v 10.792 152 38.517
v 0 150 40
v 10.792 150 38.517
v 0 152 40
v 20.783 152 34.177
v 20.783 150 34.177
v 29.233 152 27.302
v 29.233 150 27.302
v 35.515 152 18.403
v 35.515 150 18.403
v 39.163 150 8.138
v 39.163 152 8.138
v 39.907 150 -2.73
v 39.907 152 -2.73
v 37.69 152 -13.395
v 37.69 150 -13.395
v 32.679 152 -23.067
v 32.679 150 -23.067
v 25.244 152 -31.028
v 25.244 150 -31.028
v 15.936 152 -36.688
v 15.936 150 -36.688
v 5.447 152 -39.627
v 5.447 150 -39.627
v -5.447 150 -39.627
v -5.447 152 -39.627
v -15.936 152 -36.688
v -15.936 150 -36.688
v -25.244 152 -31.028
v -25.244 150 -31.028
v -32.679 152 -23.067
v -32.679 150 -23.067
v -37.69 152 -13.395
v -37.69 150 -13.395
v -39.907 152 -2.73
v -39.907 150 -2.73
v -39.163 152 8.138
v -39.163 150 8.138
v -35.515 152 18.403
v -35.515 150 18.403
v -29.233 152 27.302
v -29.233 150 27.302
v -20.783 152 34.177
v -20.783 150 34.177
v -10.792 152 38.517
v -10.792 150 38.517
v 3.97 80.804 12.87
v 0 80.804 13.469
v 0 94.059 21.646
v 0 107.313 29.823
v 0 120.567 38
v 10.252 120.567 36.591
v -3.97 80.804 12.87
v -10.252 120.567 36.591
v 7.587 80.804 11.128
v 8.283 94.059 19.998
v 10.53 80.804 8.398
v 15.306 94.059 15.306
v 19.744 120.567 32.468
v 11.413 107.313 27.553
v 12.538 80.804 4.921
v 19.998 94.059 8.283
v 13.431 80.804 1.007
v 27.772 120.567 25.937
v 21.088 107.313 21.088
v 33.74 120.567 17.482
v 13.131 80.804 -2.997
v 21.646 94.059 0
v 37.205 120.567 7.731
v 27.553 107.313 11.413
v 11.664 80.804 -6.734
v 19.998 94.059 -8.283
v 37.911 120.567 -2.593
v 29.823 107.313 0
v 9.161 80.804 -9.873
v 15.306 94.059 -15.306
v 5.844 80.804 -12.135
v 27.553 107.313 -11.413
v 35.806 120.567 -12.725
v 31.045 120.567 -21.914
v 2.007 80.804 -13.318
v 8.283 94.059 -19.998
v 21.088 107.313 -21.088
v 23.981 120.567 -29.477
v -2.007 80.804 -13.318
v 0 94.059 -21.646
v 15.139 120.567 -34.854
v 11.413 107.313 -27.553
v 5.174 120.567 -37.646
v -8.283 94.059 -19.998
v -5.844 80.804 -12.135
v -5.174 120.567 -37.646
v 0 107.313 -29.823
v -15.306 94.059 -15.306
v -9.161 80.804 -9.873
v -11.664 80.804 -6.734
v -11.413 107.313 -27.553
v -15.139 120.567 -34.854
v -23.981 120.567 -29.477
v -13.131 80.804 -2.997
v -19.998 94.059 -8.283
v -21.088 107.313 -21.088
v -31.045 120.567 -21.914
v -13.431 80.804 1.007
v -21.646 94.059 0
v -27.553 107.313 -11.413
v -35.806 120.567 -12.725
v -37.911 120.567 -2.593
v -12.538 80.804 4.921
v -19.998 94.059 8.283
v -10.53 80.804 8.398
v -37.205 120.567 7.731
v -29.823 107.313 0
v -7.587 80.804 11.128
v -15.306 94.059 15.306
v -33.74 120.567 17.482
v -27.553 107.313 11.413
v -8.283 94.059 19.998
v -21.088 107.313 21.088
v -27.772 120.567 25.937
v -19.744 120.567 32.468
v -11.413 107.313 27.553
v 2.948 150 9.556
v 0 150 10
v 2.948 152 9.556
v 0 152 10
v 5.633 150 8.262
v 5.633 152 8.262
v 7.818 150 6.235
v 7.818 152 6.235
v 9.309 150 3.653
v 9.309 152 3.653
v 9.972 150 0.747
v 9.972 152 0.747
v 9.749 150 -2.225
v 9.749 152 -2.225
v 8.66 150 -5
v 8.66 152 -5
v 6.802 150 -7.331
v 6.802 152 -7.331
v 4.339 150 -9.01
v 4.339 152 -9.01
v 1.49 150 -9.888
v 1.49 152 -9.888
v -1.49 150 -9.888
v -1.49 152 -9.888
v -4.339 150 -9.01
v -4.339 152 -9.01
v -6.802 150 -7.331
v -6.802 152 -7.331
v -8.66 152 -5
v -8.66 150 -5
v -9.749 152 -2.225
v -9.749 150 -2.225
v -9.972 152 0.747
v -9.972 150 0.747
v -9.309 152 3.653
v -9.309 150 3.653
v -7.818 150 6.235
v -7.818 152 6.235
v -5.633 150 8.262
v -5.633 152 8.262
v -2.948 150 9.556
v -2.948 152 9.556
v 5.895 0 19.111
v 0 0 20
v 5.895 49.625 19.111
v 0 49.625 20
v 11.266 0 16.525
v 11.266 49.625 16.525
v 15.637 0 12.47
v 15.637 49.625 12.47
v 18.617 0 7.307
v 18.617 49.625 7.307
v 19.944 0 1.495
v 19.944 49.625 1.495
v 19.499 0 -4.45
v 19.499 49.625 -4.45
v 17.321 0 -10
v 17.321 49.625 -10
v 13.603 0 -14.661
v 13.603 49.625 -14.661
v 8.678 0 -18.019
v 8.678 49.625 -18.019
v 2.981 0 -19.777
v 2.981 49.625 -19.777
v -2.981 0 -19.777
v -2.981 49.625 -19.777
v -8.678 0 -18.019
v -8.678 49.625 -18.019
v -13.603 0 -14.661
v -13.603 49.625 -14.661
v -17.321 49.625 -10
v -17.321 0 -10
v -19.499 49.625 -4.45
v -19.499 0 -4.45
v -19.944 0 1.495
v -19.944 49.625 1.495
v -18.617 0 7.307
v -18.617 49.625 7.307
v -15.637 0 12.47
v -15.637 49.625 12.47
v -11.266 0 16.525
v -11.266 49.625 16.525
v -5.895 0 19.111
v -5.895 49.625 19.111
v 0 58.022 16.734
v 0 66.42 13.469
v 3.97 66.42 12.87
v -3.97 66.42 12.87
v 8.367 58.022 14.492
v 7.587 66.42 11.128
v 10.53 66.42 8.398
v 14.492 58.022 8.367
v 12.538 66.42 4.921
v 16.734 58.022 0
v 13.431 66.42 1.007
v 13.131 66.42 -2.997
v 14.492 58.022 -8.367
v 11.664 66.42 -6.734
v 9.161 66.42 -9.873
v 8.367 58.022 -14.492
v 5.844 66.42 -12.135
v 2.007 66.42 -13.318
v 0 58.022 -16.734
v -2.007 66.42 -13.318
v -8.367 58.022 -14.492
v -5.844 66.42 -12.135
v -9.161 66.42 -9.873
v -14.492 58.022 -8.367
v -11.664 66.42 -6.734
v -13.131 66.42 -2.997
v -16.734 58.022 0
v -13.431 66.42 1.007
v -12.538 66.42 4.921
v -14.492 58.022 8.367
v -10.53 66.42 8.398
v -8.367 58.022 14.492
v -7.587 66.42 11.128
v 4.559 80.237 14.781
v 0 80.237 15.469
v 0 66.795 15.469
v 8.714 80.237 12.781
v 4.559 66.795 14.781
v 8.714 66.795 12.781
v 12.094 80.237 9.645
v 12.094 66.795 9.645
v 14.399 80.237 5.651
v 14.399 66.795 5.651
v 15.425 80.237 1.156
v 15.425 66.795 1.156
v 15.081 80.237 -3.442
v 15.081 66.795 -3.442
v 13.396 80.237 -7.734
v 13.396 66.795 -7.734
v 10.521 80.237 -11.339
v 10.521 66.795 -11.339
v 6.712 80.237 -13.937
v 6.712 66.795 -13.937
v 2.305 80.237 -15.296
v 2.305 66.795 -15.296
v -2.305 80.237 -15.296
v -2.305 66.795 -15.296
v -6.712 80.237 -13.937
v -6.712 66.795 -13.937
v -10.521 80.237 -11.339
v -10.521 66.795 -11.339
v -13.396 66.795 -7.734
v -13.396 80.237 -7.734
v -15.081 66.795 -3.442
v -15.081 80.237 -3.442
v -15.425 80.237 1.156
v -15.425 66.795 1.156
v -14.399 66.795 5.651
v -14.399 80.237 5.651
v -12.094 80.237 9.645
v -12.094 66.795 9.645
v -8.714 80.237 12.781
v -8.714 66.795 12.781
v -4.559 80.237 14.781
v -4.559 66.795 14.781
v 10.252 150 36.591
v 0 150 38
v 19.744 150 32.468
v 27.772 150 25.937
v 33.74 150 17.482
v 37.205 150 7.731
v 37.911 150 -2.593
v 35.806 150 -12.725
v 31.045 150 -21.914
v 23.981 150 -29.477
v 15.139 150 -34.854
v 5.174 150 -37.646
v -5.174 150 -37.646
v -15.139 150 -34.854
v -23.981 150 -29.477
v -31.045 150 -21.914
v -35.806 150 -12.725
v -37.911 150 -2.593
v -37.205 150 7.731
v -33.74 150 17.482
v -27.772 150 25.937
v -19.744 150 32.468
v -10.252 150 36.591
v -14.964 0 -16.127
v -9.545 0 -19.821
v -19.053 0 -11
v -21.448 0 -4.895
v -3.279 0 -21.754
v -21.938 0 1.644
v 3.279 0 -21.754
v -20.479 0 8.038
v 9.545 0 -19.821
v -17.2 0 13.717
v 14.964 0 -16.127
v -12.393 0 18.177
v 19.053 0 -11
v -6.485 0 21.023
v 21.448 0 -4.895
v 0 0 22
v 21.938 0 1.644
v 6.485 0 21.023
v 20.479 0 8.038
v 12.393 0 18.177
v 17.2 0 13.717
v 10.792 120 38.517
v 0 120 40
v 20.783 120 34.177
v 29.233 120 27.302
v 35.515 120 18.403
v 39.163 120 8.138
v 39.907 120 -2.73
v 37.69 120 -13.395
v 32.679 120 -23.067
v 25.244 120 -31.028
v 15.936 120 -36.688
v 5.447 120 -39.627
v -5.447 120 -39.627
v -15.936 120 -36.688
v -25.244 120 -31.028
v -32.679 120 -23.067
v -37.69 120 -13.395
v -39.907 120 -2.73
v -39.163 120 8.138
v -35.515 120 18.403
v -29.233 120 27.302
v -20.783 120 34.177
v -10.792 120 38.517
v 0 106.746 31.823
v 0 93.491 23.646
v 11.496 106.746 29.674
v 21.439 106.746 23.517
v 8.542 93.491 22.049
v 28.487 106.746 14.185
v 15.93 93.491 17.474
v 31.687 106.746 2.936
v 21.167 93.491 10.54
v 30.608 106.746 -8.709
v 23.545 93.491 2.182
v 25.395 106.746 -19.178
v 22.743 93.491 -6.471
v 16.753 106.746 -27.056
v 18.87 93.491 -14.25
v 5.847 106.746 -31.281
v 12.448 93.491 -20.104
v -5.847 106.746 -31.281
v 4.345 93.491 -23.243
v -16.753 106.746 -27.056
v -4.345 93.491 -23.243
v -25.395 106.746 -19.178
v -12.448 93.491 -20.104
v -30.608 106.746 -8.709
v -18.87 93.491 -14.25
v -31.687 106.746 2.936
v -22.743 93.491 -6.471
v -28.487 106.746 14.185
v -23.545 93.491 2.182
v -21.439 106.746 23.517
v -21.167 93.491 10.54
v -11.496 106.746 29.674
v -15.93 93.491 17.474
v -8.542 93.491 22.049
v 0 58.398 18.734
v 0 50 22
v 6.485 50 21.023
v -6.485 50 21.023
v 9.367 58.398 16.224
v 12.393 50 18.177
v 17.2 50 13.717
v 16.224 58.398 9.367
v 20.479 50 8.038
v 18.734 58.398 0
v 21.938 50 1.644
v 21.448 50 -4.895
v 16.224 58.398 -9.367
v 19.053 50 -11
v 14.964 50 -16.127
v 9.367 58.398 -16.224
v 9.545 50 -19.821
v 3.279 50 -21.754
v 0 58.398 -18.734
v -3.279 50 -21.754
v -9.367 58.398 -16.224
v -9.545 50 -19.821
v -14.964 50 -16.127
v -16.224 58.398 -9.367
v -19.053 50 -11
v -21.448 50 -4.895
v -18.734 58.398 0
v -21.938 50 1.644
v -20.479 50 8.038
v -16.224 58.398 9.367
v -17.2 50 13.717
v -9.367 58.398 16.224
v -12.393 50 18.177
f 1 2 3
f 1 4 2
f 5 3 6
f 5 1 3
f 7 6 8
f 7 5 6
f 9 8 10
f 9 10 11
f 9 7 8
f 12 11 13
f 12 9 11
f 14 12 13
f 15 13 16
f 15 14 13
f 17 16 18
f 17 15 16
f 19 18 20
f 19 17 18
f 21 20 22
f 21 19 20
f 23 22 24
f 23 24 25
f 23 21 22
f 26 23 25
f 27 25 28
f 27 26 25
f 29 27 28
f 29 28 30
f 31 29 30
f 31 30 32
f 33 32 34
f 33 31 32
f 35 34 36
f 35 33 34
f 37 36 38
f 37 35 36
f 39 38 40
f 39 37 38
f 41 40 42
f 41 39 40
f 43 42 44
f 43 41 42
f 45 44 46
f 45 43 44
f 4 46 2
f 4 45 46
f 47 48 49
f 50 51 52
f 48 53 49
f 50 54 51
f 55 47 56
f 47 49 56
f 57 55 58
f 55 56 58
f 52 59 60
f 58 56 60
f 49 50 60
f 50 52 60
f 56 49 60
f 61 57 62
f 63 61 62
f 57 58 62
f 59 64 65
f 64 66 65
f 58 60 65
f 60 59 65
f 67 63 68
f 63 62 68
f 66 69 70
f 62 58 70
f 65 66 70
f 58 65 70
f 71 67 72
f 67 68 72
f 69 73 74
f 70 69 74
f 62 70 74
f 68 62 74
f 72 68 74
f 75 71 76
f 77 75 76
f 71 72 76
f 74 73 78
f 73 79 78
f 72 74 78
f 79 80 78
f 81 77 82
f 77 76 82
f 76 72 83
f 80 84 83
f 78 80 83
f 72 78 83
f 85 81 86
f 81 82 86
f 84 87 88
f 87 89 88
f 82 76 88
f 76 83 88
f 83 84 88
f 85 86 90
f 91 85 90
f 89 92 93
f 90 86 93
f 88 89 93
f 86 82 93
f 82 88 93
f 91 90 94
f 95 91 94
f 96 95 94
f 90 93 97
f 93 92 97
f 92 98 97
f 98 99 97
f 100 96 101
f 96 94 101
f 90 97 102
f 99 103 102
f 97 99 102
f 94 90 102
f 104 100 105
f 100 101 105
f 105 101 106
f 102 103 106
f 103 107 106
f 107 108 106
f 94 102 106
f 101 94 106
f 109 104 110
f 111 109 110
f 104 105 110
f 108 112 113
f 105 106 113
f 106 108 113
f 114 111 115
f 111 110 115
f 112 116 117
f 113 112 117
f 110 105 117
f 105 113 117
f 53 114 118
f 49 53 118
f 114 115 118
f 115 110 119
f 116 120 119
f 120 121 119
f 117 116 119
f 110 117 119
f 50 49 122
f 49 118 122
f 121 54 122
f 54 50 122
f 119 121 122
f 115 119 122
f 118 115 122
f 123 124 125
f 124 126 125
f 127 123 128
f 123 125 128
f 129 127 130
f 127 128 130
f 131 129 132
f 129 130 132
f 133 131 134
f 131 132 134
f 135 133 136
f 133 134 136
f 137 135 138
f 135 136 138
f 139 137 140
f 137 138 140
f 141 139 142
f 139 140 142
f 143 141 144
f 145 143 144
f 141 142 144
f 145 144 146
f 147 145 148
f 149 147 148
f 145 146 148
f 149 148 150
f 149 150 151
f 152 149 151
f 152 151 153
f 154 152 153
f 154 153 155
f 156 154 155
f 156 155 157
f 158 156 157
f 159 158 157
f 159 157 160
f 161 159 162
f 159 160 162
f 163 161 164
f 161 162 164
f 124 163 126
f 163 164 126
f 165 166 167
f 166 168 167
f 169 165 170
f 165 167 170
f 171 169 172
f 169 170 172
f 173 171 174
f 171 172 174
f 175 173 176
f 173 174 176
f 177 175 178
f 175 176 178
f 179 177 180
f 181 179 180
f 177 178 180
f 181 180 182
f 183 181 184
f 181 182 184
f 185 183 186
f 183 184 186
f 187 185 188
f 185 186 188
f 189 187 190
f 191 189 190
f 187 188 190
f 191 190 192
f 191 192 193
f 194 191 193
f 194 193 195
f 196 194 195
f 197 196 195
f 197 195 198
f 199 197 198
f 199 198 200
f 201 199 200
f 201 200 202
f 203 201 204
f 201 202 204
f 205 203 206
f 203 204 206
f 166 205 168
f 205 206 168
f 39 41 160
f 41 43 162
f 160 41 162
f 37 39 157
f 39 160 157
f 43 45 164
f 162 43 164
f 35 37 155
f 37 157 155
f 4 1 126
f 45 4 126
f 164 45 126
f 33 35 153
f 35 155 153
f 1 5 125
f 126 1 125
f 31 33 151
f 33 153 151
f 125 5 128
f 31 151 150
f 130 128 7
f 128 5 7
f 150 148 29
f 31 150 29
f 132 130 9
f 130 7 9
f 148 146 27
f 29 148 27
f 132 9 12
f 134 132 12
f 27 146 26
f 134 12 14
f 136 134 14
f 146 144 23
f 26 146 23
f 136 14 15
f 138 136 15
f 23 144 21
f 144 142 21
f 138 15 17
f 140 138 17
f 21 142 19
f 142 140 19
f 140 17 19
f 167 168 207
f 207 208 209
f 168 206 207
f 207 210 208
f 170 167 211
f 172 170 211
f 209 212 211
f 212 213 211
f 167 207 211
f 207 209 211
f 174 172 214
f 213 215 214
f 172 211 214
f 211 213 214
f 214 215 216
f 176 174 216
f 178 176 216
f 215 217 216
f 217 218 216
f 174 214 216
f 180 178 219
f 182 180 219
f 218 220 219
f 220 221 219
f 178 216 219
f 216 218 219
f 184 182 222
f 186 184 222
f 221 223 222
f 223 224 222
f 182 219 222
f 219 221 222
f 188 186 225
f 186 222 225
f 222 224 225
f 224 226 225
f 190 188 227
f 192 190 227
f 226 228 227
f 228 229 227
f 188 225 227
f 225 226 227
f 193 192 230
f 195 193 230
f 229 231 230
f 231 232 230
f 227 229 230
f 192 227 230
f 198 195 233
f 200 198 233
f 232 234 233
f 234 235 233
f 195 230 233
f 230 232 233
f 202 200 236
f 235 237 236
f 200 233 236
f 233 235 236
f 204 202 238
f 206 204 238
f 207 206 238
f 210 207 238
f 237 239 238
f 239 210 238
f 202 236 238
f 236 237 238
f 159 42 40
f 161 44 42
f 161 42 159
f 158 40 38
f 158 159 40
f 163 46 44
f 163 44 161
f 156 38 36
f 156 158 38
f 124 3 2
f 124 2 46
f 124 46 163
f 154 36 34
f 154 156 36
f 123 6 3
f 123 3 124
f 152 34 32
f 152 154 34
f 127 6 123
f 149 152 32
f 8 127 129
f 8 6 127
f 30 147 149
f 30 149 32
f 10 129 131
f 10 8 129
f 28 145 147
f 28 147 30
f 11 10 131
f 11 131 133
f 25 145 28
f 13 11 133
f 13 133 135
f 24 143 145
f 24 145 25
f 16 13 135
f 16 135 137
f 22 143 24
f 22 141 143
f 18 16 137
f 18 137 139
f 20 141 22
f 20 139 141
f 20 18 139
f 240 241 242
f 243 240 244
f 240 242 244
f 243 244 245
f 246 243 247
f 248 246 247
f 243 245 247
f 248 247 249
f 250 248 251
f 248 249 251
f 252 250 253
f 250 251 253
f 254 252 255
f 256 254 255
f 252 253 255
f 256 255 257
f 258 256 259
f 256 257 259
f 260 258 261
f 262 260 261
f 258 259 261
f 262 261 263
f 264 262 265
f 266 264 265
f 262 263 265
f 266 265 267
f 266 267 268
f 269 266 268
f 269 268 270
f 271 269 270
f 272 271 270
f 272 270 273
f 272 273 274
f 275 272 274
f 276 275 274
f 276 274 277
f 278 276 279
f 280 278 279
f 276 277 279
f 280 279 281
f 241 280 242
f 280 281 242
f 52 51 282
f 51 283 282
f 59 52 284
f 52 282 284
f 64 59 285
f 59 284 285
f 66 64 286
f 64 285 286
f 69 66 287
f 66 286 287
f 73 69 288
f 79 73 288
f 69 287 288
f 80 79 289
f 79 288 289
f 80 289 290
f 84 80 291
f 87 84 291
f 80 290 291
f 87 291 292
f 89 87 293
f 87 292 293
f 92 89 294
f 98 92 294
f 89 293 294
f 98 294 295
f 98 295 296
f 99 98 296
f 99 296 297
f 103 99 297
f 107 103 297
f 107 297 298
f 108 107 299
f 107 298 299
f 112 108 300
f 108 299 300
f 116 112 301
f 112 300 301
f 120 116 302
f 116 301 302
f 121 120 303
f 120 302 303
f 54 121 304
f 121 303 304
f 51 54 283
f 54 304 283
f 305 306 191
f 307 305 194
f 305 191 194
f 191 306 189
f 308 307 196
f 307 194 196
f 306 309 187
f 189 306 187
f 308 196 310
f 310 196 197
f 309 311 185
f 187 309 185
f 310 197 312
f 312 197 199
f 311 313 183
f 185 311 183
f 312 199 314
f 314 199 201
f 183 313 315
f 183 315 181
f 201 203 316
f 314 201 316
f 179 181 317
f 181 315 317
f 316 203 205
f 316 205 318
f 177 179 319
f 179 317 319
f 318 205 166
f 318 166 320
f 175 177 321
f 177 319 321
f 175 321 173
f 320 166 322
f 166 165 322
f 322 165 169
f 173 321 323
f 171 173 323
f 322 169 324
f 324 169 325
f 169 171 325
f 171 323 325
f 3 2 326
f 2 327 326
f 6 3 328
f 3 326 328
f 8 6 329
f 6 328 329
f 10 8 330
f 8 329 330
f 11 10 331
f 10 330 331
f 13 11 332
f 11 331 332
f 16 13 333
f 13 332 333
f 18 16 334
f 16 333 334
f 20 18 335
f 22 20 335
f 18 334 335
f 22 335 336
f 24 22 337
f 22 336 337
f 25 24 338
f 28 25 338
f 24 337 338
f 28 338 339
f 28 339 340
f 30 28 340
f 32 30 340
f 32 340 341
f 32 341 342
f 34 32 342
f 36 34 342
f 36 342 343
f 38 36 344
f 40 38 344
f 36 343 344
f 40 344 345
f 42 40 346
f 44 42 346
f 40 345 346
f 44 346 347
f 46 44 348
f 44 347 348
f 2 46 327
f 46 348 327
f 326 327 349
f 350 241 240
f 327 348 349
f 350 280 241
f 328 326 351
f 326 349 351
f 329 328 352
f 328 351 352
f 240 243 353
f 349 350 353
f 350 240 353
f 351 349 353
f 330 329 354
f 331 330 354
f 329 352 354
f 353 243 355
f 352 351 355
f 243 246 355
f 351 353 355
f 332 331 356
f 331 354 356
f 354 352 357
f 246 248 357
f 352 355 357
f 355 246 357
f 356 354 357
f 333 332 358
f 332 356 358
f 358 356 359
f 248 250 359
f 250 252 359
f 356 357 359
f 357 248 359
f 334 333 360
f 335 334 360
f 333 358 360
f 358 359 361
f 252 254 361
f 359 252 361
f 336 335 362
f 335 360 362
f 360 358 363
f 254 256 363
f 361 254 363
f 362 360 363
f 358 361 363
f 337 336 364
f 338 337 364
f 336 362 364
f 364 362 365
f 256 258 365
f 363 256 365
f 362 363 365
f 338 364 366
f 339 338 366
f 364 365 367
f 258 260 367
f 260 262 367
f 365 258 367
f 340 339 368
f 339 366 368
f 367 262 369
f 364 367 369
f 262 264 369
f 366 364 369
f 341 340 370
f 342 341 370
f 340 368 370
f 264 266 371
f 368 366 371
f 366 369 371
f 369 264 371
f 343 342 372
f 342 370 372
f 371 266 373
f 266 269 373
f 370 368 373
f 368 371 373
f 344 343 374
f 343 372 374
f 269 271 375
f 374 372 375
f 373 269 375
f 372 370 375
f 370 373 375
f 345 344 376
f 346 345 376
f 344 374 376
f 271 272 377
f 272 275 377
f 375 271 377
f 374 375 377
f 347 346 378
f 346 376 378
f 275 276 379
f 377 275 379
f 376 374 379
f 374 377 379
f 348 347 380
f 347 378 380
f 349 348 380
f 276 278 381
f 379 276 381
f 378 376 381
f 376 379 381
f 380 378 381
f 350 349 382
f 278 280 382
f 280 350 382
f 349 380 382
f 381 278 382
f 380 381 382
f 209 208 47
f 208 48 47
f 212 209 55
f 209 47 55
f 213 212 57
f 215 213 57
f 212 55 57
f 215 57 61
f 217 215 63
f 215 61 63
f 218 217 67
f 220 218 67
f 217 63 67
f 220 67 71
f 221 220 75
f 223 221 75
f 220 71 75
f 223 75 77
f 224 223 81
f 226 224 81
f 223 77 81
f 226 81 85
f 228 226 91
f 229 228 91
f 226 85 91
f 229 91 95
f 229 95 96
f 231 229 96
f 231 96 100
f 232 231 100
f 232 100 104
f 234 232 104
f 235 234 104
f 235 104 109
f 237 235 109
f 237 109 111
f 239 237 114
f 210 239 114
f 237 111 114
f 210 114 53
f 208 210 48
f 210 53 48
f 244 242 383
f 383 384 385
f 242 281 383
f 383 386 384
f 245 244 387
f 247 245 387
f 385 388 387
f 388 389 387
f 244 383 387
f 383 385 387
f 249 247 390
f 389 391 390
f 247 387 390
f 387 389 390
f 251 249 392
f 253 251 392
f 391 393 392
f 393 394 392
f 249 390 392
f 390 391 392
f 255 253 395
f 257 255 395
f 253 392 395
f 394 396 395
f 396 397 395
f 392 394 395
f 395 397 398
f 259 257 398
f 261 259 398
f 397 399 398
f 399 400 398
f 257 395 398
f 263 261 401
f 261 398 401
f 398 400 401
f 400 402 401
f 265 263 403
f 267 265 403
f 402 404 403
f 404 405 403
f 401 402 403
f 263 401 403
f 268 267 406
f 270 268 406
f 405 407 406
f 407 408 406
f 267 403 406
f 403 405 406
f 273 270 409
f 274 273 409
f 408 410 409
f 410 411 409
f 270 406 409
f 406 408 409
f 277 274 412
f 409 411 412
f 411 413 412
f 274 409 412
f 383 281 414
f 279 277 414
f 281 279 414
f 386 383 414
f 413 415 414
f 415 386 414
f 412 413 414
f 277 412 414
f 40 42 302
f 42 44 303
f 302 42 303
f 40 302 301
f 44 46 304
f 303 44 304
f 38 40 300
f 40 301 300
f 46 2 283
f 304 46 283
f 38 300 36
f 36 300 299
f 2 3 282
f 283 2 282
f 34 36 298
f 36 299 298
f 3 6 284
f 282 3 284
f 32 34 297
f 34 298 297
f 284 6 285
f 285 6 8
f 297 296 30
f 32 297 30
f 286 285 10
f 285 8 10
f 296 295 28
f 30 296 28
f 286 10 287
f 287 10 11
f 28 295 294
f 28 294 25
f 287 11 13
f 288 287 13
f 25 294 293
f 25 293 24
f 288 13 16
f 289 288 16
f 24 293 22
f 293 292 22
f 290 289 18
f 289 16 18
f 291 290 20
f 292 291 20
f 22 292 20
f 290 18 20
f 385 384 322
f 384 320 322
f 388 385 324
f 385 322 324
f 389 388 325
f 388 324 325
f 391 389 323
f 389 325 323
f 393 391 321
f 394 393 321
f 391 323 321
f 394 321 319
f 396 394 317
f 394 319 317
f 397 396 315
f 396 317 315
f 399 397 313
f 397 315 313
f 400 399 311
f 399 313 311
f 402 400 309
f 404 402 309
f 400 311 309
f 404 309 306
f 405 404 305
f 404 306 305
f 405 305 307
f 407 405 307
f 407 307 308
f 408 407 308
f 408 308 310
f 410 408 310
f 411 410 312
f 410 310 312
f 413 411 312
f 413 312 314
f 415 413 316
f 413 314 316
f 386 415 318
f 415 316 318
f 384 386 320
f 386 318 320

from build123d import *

# Parameters (mm, degrees)
F2_W = 2
F2_H = 30


with BuildPart() as f1:
    # F0 (on Right) → F1 (revolve)
    with BuildSketch(Plane.YZ):
        Polygon((50, 22), (0, 22), (0, 20), (49.624798, 20), (66.419822, 13.468601), (80.804184, 13.468601), (120.567301, 38), (150, 38), (150, 40), (120, 40), (80.236883, 15.468601), (66.795024, 15.468601), align=None)
    revolve(axis=Axis((0, 94.187401, 0), (0, 1, 0)))


with BuildPart() as f3:
    # F2 (on Right) → F3 (revolve)
    with BuildSketch(Plane.YZ):
        with Locations((151, 25)):
            Rectangle(F2_W, F2_H)
    revolve(axis=Axis((0, 91.58729, 0), (0, 1, 0)))


solid = Compound([f1.part, f3.part])
